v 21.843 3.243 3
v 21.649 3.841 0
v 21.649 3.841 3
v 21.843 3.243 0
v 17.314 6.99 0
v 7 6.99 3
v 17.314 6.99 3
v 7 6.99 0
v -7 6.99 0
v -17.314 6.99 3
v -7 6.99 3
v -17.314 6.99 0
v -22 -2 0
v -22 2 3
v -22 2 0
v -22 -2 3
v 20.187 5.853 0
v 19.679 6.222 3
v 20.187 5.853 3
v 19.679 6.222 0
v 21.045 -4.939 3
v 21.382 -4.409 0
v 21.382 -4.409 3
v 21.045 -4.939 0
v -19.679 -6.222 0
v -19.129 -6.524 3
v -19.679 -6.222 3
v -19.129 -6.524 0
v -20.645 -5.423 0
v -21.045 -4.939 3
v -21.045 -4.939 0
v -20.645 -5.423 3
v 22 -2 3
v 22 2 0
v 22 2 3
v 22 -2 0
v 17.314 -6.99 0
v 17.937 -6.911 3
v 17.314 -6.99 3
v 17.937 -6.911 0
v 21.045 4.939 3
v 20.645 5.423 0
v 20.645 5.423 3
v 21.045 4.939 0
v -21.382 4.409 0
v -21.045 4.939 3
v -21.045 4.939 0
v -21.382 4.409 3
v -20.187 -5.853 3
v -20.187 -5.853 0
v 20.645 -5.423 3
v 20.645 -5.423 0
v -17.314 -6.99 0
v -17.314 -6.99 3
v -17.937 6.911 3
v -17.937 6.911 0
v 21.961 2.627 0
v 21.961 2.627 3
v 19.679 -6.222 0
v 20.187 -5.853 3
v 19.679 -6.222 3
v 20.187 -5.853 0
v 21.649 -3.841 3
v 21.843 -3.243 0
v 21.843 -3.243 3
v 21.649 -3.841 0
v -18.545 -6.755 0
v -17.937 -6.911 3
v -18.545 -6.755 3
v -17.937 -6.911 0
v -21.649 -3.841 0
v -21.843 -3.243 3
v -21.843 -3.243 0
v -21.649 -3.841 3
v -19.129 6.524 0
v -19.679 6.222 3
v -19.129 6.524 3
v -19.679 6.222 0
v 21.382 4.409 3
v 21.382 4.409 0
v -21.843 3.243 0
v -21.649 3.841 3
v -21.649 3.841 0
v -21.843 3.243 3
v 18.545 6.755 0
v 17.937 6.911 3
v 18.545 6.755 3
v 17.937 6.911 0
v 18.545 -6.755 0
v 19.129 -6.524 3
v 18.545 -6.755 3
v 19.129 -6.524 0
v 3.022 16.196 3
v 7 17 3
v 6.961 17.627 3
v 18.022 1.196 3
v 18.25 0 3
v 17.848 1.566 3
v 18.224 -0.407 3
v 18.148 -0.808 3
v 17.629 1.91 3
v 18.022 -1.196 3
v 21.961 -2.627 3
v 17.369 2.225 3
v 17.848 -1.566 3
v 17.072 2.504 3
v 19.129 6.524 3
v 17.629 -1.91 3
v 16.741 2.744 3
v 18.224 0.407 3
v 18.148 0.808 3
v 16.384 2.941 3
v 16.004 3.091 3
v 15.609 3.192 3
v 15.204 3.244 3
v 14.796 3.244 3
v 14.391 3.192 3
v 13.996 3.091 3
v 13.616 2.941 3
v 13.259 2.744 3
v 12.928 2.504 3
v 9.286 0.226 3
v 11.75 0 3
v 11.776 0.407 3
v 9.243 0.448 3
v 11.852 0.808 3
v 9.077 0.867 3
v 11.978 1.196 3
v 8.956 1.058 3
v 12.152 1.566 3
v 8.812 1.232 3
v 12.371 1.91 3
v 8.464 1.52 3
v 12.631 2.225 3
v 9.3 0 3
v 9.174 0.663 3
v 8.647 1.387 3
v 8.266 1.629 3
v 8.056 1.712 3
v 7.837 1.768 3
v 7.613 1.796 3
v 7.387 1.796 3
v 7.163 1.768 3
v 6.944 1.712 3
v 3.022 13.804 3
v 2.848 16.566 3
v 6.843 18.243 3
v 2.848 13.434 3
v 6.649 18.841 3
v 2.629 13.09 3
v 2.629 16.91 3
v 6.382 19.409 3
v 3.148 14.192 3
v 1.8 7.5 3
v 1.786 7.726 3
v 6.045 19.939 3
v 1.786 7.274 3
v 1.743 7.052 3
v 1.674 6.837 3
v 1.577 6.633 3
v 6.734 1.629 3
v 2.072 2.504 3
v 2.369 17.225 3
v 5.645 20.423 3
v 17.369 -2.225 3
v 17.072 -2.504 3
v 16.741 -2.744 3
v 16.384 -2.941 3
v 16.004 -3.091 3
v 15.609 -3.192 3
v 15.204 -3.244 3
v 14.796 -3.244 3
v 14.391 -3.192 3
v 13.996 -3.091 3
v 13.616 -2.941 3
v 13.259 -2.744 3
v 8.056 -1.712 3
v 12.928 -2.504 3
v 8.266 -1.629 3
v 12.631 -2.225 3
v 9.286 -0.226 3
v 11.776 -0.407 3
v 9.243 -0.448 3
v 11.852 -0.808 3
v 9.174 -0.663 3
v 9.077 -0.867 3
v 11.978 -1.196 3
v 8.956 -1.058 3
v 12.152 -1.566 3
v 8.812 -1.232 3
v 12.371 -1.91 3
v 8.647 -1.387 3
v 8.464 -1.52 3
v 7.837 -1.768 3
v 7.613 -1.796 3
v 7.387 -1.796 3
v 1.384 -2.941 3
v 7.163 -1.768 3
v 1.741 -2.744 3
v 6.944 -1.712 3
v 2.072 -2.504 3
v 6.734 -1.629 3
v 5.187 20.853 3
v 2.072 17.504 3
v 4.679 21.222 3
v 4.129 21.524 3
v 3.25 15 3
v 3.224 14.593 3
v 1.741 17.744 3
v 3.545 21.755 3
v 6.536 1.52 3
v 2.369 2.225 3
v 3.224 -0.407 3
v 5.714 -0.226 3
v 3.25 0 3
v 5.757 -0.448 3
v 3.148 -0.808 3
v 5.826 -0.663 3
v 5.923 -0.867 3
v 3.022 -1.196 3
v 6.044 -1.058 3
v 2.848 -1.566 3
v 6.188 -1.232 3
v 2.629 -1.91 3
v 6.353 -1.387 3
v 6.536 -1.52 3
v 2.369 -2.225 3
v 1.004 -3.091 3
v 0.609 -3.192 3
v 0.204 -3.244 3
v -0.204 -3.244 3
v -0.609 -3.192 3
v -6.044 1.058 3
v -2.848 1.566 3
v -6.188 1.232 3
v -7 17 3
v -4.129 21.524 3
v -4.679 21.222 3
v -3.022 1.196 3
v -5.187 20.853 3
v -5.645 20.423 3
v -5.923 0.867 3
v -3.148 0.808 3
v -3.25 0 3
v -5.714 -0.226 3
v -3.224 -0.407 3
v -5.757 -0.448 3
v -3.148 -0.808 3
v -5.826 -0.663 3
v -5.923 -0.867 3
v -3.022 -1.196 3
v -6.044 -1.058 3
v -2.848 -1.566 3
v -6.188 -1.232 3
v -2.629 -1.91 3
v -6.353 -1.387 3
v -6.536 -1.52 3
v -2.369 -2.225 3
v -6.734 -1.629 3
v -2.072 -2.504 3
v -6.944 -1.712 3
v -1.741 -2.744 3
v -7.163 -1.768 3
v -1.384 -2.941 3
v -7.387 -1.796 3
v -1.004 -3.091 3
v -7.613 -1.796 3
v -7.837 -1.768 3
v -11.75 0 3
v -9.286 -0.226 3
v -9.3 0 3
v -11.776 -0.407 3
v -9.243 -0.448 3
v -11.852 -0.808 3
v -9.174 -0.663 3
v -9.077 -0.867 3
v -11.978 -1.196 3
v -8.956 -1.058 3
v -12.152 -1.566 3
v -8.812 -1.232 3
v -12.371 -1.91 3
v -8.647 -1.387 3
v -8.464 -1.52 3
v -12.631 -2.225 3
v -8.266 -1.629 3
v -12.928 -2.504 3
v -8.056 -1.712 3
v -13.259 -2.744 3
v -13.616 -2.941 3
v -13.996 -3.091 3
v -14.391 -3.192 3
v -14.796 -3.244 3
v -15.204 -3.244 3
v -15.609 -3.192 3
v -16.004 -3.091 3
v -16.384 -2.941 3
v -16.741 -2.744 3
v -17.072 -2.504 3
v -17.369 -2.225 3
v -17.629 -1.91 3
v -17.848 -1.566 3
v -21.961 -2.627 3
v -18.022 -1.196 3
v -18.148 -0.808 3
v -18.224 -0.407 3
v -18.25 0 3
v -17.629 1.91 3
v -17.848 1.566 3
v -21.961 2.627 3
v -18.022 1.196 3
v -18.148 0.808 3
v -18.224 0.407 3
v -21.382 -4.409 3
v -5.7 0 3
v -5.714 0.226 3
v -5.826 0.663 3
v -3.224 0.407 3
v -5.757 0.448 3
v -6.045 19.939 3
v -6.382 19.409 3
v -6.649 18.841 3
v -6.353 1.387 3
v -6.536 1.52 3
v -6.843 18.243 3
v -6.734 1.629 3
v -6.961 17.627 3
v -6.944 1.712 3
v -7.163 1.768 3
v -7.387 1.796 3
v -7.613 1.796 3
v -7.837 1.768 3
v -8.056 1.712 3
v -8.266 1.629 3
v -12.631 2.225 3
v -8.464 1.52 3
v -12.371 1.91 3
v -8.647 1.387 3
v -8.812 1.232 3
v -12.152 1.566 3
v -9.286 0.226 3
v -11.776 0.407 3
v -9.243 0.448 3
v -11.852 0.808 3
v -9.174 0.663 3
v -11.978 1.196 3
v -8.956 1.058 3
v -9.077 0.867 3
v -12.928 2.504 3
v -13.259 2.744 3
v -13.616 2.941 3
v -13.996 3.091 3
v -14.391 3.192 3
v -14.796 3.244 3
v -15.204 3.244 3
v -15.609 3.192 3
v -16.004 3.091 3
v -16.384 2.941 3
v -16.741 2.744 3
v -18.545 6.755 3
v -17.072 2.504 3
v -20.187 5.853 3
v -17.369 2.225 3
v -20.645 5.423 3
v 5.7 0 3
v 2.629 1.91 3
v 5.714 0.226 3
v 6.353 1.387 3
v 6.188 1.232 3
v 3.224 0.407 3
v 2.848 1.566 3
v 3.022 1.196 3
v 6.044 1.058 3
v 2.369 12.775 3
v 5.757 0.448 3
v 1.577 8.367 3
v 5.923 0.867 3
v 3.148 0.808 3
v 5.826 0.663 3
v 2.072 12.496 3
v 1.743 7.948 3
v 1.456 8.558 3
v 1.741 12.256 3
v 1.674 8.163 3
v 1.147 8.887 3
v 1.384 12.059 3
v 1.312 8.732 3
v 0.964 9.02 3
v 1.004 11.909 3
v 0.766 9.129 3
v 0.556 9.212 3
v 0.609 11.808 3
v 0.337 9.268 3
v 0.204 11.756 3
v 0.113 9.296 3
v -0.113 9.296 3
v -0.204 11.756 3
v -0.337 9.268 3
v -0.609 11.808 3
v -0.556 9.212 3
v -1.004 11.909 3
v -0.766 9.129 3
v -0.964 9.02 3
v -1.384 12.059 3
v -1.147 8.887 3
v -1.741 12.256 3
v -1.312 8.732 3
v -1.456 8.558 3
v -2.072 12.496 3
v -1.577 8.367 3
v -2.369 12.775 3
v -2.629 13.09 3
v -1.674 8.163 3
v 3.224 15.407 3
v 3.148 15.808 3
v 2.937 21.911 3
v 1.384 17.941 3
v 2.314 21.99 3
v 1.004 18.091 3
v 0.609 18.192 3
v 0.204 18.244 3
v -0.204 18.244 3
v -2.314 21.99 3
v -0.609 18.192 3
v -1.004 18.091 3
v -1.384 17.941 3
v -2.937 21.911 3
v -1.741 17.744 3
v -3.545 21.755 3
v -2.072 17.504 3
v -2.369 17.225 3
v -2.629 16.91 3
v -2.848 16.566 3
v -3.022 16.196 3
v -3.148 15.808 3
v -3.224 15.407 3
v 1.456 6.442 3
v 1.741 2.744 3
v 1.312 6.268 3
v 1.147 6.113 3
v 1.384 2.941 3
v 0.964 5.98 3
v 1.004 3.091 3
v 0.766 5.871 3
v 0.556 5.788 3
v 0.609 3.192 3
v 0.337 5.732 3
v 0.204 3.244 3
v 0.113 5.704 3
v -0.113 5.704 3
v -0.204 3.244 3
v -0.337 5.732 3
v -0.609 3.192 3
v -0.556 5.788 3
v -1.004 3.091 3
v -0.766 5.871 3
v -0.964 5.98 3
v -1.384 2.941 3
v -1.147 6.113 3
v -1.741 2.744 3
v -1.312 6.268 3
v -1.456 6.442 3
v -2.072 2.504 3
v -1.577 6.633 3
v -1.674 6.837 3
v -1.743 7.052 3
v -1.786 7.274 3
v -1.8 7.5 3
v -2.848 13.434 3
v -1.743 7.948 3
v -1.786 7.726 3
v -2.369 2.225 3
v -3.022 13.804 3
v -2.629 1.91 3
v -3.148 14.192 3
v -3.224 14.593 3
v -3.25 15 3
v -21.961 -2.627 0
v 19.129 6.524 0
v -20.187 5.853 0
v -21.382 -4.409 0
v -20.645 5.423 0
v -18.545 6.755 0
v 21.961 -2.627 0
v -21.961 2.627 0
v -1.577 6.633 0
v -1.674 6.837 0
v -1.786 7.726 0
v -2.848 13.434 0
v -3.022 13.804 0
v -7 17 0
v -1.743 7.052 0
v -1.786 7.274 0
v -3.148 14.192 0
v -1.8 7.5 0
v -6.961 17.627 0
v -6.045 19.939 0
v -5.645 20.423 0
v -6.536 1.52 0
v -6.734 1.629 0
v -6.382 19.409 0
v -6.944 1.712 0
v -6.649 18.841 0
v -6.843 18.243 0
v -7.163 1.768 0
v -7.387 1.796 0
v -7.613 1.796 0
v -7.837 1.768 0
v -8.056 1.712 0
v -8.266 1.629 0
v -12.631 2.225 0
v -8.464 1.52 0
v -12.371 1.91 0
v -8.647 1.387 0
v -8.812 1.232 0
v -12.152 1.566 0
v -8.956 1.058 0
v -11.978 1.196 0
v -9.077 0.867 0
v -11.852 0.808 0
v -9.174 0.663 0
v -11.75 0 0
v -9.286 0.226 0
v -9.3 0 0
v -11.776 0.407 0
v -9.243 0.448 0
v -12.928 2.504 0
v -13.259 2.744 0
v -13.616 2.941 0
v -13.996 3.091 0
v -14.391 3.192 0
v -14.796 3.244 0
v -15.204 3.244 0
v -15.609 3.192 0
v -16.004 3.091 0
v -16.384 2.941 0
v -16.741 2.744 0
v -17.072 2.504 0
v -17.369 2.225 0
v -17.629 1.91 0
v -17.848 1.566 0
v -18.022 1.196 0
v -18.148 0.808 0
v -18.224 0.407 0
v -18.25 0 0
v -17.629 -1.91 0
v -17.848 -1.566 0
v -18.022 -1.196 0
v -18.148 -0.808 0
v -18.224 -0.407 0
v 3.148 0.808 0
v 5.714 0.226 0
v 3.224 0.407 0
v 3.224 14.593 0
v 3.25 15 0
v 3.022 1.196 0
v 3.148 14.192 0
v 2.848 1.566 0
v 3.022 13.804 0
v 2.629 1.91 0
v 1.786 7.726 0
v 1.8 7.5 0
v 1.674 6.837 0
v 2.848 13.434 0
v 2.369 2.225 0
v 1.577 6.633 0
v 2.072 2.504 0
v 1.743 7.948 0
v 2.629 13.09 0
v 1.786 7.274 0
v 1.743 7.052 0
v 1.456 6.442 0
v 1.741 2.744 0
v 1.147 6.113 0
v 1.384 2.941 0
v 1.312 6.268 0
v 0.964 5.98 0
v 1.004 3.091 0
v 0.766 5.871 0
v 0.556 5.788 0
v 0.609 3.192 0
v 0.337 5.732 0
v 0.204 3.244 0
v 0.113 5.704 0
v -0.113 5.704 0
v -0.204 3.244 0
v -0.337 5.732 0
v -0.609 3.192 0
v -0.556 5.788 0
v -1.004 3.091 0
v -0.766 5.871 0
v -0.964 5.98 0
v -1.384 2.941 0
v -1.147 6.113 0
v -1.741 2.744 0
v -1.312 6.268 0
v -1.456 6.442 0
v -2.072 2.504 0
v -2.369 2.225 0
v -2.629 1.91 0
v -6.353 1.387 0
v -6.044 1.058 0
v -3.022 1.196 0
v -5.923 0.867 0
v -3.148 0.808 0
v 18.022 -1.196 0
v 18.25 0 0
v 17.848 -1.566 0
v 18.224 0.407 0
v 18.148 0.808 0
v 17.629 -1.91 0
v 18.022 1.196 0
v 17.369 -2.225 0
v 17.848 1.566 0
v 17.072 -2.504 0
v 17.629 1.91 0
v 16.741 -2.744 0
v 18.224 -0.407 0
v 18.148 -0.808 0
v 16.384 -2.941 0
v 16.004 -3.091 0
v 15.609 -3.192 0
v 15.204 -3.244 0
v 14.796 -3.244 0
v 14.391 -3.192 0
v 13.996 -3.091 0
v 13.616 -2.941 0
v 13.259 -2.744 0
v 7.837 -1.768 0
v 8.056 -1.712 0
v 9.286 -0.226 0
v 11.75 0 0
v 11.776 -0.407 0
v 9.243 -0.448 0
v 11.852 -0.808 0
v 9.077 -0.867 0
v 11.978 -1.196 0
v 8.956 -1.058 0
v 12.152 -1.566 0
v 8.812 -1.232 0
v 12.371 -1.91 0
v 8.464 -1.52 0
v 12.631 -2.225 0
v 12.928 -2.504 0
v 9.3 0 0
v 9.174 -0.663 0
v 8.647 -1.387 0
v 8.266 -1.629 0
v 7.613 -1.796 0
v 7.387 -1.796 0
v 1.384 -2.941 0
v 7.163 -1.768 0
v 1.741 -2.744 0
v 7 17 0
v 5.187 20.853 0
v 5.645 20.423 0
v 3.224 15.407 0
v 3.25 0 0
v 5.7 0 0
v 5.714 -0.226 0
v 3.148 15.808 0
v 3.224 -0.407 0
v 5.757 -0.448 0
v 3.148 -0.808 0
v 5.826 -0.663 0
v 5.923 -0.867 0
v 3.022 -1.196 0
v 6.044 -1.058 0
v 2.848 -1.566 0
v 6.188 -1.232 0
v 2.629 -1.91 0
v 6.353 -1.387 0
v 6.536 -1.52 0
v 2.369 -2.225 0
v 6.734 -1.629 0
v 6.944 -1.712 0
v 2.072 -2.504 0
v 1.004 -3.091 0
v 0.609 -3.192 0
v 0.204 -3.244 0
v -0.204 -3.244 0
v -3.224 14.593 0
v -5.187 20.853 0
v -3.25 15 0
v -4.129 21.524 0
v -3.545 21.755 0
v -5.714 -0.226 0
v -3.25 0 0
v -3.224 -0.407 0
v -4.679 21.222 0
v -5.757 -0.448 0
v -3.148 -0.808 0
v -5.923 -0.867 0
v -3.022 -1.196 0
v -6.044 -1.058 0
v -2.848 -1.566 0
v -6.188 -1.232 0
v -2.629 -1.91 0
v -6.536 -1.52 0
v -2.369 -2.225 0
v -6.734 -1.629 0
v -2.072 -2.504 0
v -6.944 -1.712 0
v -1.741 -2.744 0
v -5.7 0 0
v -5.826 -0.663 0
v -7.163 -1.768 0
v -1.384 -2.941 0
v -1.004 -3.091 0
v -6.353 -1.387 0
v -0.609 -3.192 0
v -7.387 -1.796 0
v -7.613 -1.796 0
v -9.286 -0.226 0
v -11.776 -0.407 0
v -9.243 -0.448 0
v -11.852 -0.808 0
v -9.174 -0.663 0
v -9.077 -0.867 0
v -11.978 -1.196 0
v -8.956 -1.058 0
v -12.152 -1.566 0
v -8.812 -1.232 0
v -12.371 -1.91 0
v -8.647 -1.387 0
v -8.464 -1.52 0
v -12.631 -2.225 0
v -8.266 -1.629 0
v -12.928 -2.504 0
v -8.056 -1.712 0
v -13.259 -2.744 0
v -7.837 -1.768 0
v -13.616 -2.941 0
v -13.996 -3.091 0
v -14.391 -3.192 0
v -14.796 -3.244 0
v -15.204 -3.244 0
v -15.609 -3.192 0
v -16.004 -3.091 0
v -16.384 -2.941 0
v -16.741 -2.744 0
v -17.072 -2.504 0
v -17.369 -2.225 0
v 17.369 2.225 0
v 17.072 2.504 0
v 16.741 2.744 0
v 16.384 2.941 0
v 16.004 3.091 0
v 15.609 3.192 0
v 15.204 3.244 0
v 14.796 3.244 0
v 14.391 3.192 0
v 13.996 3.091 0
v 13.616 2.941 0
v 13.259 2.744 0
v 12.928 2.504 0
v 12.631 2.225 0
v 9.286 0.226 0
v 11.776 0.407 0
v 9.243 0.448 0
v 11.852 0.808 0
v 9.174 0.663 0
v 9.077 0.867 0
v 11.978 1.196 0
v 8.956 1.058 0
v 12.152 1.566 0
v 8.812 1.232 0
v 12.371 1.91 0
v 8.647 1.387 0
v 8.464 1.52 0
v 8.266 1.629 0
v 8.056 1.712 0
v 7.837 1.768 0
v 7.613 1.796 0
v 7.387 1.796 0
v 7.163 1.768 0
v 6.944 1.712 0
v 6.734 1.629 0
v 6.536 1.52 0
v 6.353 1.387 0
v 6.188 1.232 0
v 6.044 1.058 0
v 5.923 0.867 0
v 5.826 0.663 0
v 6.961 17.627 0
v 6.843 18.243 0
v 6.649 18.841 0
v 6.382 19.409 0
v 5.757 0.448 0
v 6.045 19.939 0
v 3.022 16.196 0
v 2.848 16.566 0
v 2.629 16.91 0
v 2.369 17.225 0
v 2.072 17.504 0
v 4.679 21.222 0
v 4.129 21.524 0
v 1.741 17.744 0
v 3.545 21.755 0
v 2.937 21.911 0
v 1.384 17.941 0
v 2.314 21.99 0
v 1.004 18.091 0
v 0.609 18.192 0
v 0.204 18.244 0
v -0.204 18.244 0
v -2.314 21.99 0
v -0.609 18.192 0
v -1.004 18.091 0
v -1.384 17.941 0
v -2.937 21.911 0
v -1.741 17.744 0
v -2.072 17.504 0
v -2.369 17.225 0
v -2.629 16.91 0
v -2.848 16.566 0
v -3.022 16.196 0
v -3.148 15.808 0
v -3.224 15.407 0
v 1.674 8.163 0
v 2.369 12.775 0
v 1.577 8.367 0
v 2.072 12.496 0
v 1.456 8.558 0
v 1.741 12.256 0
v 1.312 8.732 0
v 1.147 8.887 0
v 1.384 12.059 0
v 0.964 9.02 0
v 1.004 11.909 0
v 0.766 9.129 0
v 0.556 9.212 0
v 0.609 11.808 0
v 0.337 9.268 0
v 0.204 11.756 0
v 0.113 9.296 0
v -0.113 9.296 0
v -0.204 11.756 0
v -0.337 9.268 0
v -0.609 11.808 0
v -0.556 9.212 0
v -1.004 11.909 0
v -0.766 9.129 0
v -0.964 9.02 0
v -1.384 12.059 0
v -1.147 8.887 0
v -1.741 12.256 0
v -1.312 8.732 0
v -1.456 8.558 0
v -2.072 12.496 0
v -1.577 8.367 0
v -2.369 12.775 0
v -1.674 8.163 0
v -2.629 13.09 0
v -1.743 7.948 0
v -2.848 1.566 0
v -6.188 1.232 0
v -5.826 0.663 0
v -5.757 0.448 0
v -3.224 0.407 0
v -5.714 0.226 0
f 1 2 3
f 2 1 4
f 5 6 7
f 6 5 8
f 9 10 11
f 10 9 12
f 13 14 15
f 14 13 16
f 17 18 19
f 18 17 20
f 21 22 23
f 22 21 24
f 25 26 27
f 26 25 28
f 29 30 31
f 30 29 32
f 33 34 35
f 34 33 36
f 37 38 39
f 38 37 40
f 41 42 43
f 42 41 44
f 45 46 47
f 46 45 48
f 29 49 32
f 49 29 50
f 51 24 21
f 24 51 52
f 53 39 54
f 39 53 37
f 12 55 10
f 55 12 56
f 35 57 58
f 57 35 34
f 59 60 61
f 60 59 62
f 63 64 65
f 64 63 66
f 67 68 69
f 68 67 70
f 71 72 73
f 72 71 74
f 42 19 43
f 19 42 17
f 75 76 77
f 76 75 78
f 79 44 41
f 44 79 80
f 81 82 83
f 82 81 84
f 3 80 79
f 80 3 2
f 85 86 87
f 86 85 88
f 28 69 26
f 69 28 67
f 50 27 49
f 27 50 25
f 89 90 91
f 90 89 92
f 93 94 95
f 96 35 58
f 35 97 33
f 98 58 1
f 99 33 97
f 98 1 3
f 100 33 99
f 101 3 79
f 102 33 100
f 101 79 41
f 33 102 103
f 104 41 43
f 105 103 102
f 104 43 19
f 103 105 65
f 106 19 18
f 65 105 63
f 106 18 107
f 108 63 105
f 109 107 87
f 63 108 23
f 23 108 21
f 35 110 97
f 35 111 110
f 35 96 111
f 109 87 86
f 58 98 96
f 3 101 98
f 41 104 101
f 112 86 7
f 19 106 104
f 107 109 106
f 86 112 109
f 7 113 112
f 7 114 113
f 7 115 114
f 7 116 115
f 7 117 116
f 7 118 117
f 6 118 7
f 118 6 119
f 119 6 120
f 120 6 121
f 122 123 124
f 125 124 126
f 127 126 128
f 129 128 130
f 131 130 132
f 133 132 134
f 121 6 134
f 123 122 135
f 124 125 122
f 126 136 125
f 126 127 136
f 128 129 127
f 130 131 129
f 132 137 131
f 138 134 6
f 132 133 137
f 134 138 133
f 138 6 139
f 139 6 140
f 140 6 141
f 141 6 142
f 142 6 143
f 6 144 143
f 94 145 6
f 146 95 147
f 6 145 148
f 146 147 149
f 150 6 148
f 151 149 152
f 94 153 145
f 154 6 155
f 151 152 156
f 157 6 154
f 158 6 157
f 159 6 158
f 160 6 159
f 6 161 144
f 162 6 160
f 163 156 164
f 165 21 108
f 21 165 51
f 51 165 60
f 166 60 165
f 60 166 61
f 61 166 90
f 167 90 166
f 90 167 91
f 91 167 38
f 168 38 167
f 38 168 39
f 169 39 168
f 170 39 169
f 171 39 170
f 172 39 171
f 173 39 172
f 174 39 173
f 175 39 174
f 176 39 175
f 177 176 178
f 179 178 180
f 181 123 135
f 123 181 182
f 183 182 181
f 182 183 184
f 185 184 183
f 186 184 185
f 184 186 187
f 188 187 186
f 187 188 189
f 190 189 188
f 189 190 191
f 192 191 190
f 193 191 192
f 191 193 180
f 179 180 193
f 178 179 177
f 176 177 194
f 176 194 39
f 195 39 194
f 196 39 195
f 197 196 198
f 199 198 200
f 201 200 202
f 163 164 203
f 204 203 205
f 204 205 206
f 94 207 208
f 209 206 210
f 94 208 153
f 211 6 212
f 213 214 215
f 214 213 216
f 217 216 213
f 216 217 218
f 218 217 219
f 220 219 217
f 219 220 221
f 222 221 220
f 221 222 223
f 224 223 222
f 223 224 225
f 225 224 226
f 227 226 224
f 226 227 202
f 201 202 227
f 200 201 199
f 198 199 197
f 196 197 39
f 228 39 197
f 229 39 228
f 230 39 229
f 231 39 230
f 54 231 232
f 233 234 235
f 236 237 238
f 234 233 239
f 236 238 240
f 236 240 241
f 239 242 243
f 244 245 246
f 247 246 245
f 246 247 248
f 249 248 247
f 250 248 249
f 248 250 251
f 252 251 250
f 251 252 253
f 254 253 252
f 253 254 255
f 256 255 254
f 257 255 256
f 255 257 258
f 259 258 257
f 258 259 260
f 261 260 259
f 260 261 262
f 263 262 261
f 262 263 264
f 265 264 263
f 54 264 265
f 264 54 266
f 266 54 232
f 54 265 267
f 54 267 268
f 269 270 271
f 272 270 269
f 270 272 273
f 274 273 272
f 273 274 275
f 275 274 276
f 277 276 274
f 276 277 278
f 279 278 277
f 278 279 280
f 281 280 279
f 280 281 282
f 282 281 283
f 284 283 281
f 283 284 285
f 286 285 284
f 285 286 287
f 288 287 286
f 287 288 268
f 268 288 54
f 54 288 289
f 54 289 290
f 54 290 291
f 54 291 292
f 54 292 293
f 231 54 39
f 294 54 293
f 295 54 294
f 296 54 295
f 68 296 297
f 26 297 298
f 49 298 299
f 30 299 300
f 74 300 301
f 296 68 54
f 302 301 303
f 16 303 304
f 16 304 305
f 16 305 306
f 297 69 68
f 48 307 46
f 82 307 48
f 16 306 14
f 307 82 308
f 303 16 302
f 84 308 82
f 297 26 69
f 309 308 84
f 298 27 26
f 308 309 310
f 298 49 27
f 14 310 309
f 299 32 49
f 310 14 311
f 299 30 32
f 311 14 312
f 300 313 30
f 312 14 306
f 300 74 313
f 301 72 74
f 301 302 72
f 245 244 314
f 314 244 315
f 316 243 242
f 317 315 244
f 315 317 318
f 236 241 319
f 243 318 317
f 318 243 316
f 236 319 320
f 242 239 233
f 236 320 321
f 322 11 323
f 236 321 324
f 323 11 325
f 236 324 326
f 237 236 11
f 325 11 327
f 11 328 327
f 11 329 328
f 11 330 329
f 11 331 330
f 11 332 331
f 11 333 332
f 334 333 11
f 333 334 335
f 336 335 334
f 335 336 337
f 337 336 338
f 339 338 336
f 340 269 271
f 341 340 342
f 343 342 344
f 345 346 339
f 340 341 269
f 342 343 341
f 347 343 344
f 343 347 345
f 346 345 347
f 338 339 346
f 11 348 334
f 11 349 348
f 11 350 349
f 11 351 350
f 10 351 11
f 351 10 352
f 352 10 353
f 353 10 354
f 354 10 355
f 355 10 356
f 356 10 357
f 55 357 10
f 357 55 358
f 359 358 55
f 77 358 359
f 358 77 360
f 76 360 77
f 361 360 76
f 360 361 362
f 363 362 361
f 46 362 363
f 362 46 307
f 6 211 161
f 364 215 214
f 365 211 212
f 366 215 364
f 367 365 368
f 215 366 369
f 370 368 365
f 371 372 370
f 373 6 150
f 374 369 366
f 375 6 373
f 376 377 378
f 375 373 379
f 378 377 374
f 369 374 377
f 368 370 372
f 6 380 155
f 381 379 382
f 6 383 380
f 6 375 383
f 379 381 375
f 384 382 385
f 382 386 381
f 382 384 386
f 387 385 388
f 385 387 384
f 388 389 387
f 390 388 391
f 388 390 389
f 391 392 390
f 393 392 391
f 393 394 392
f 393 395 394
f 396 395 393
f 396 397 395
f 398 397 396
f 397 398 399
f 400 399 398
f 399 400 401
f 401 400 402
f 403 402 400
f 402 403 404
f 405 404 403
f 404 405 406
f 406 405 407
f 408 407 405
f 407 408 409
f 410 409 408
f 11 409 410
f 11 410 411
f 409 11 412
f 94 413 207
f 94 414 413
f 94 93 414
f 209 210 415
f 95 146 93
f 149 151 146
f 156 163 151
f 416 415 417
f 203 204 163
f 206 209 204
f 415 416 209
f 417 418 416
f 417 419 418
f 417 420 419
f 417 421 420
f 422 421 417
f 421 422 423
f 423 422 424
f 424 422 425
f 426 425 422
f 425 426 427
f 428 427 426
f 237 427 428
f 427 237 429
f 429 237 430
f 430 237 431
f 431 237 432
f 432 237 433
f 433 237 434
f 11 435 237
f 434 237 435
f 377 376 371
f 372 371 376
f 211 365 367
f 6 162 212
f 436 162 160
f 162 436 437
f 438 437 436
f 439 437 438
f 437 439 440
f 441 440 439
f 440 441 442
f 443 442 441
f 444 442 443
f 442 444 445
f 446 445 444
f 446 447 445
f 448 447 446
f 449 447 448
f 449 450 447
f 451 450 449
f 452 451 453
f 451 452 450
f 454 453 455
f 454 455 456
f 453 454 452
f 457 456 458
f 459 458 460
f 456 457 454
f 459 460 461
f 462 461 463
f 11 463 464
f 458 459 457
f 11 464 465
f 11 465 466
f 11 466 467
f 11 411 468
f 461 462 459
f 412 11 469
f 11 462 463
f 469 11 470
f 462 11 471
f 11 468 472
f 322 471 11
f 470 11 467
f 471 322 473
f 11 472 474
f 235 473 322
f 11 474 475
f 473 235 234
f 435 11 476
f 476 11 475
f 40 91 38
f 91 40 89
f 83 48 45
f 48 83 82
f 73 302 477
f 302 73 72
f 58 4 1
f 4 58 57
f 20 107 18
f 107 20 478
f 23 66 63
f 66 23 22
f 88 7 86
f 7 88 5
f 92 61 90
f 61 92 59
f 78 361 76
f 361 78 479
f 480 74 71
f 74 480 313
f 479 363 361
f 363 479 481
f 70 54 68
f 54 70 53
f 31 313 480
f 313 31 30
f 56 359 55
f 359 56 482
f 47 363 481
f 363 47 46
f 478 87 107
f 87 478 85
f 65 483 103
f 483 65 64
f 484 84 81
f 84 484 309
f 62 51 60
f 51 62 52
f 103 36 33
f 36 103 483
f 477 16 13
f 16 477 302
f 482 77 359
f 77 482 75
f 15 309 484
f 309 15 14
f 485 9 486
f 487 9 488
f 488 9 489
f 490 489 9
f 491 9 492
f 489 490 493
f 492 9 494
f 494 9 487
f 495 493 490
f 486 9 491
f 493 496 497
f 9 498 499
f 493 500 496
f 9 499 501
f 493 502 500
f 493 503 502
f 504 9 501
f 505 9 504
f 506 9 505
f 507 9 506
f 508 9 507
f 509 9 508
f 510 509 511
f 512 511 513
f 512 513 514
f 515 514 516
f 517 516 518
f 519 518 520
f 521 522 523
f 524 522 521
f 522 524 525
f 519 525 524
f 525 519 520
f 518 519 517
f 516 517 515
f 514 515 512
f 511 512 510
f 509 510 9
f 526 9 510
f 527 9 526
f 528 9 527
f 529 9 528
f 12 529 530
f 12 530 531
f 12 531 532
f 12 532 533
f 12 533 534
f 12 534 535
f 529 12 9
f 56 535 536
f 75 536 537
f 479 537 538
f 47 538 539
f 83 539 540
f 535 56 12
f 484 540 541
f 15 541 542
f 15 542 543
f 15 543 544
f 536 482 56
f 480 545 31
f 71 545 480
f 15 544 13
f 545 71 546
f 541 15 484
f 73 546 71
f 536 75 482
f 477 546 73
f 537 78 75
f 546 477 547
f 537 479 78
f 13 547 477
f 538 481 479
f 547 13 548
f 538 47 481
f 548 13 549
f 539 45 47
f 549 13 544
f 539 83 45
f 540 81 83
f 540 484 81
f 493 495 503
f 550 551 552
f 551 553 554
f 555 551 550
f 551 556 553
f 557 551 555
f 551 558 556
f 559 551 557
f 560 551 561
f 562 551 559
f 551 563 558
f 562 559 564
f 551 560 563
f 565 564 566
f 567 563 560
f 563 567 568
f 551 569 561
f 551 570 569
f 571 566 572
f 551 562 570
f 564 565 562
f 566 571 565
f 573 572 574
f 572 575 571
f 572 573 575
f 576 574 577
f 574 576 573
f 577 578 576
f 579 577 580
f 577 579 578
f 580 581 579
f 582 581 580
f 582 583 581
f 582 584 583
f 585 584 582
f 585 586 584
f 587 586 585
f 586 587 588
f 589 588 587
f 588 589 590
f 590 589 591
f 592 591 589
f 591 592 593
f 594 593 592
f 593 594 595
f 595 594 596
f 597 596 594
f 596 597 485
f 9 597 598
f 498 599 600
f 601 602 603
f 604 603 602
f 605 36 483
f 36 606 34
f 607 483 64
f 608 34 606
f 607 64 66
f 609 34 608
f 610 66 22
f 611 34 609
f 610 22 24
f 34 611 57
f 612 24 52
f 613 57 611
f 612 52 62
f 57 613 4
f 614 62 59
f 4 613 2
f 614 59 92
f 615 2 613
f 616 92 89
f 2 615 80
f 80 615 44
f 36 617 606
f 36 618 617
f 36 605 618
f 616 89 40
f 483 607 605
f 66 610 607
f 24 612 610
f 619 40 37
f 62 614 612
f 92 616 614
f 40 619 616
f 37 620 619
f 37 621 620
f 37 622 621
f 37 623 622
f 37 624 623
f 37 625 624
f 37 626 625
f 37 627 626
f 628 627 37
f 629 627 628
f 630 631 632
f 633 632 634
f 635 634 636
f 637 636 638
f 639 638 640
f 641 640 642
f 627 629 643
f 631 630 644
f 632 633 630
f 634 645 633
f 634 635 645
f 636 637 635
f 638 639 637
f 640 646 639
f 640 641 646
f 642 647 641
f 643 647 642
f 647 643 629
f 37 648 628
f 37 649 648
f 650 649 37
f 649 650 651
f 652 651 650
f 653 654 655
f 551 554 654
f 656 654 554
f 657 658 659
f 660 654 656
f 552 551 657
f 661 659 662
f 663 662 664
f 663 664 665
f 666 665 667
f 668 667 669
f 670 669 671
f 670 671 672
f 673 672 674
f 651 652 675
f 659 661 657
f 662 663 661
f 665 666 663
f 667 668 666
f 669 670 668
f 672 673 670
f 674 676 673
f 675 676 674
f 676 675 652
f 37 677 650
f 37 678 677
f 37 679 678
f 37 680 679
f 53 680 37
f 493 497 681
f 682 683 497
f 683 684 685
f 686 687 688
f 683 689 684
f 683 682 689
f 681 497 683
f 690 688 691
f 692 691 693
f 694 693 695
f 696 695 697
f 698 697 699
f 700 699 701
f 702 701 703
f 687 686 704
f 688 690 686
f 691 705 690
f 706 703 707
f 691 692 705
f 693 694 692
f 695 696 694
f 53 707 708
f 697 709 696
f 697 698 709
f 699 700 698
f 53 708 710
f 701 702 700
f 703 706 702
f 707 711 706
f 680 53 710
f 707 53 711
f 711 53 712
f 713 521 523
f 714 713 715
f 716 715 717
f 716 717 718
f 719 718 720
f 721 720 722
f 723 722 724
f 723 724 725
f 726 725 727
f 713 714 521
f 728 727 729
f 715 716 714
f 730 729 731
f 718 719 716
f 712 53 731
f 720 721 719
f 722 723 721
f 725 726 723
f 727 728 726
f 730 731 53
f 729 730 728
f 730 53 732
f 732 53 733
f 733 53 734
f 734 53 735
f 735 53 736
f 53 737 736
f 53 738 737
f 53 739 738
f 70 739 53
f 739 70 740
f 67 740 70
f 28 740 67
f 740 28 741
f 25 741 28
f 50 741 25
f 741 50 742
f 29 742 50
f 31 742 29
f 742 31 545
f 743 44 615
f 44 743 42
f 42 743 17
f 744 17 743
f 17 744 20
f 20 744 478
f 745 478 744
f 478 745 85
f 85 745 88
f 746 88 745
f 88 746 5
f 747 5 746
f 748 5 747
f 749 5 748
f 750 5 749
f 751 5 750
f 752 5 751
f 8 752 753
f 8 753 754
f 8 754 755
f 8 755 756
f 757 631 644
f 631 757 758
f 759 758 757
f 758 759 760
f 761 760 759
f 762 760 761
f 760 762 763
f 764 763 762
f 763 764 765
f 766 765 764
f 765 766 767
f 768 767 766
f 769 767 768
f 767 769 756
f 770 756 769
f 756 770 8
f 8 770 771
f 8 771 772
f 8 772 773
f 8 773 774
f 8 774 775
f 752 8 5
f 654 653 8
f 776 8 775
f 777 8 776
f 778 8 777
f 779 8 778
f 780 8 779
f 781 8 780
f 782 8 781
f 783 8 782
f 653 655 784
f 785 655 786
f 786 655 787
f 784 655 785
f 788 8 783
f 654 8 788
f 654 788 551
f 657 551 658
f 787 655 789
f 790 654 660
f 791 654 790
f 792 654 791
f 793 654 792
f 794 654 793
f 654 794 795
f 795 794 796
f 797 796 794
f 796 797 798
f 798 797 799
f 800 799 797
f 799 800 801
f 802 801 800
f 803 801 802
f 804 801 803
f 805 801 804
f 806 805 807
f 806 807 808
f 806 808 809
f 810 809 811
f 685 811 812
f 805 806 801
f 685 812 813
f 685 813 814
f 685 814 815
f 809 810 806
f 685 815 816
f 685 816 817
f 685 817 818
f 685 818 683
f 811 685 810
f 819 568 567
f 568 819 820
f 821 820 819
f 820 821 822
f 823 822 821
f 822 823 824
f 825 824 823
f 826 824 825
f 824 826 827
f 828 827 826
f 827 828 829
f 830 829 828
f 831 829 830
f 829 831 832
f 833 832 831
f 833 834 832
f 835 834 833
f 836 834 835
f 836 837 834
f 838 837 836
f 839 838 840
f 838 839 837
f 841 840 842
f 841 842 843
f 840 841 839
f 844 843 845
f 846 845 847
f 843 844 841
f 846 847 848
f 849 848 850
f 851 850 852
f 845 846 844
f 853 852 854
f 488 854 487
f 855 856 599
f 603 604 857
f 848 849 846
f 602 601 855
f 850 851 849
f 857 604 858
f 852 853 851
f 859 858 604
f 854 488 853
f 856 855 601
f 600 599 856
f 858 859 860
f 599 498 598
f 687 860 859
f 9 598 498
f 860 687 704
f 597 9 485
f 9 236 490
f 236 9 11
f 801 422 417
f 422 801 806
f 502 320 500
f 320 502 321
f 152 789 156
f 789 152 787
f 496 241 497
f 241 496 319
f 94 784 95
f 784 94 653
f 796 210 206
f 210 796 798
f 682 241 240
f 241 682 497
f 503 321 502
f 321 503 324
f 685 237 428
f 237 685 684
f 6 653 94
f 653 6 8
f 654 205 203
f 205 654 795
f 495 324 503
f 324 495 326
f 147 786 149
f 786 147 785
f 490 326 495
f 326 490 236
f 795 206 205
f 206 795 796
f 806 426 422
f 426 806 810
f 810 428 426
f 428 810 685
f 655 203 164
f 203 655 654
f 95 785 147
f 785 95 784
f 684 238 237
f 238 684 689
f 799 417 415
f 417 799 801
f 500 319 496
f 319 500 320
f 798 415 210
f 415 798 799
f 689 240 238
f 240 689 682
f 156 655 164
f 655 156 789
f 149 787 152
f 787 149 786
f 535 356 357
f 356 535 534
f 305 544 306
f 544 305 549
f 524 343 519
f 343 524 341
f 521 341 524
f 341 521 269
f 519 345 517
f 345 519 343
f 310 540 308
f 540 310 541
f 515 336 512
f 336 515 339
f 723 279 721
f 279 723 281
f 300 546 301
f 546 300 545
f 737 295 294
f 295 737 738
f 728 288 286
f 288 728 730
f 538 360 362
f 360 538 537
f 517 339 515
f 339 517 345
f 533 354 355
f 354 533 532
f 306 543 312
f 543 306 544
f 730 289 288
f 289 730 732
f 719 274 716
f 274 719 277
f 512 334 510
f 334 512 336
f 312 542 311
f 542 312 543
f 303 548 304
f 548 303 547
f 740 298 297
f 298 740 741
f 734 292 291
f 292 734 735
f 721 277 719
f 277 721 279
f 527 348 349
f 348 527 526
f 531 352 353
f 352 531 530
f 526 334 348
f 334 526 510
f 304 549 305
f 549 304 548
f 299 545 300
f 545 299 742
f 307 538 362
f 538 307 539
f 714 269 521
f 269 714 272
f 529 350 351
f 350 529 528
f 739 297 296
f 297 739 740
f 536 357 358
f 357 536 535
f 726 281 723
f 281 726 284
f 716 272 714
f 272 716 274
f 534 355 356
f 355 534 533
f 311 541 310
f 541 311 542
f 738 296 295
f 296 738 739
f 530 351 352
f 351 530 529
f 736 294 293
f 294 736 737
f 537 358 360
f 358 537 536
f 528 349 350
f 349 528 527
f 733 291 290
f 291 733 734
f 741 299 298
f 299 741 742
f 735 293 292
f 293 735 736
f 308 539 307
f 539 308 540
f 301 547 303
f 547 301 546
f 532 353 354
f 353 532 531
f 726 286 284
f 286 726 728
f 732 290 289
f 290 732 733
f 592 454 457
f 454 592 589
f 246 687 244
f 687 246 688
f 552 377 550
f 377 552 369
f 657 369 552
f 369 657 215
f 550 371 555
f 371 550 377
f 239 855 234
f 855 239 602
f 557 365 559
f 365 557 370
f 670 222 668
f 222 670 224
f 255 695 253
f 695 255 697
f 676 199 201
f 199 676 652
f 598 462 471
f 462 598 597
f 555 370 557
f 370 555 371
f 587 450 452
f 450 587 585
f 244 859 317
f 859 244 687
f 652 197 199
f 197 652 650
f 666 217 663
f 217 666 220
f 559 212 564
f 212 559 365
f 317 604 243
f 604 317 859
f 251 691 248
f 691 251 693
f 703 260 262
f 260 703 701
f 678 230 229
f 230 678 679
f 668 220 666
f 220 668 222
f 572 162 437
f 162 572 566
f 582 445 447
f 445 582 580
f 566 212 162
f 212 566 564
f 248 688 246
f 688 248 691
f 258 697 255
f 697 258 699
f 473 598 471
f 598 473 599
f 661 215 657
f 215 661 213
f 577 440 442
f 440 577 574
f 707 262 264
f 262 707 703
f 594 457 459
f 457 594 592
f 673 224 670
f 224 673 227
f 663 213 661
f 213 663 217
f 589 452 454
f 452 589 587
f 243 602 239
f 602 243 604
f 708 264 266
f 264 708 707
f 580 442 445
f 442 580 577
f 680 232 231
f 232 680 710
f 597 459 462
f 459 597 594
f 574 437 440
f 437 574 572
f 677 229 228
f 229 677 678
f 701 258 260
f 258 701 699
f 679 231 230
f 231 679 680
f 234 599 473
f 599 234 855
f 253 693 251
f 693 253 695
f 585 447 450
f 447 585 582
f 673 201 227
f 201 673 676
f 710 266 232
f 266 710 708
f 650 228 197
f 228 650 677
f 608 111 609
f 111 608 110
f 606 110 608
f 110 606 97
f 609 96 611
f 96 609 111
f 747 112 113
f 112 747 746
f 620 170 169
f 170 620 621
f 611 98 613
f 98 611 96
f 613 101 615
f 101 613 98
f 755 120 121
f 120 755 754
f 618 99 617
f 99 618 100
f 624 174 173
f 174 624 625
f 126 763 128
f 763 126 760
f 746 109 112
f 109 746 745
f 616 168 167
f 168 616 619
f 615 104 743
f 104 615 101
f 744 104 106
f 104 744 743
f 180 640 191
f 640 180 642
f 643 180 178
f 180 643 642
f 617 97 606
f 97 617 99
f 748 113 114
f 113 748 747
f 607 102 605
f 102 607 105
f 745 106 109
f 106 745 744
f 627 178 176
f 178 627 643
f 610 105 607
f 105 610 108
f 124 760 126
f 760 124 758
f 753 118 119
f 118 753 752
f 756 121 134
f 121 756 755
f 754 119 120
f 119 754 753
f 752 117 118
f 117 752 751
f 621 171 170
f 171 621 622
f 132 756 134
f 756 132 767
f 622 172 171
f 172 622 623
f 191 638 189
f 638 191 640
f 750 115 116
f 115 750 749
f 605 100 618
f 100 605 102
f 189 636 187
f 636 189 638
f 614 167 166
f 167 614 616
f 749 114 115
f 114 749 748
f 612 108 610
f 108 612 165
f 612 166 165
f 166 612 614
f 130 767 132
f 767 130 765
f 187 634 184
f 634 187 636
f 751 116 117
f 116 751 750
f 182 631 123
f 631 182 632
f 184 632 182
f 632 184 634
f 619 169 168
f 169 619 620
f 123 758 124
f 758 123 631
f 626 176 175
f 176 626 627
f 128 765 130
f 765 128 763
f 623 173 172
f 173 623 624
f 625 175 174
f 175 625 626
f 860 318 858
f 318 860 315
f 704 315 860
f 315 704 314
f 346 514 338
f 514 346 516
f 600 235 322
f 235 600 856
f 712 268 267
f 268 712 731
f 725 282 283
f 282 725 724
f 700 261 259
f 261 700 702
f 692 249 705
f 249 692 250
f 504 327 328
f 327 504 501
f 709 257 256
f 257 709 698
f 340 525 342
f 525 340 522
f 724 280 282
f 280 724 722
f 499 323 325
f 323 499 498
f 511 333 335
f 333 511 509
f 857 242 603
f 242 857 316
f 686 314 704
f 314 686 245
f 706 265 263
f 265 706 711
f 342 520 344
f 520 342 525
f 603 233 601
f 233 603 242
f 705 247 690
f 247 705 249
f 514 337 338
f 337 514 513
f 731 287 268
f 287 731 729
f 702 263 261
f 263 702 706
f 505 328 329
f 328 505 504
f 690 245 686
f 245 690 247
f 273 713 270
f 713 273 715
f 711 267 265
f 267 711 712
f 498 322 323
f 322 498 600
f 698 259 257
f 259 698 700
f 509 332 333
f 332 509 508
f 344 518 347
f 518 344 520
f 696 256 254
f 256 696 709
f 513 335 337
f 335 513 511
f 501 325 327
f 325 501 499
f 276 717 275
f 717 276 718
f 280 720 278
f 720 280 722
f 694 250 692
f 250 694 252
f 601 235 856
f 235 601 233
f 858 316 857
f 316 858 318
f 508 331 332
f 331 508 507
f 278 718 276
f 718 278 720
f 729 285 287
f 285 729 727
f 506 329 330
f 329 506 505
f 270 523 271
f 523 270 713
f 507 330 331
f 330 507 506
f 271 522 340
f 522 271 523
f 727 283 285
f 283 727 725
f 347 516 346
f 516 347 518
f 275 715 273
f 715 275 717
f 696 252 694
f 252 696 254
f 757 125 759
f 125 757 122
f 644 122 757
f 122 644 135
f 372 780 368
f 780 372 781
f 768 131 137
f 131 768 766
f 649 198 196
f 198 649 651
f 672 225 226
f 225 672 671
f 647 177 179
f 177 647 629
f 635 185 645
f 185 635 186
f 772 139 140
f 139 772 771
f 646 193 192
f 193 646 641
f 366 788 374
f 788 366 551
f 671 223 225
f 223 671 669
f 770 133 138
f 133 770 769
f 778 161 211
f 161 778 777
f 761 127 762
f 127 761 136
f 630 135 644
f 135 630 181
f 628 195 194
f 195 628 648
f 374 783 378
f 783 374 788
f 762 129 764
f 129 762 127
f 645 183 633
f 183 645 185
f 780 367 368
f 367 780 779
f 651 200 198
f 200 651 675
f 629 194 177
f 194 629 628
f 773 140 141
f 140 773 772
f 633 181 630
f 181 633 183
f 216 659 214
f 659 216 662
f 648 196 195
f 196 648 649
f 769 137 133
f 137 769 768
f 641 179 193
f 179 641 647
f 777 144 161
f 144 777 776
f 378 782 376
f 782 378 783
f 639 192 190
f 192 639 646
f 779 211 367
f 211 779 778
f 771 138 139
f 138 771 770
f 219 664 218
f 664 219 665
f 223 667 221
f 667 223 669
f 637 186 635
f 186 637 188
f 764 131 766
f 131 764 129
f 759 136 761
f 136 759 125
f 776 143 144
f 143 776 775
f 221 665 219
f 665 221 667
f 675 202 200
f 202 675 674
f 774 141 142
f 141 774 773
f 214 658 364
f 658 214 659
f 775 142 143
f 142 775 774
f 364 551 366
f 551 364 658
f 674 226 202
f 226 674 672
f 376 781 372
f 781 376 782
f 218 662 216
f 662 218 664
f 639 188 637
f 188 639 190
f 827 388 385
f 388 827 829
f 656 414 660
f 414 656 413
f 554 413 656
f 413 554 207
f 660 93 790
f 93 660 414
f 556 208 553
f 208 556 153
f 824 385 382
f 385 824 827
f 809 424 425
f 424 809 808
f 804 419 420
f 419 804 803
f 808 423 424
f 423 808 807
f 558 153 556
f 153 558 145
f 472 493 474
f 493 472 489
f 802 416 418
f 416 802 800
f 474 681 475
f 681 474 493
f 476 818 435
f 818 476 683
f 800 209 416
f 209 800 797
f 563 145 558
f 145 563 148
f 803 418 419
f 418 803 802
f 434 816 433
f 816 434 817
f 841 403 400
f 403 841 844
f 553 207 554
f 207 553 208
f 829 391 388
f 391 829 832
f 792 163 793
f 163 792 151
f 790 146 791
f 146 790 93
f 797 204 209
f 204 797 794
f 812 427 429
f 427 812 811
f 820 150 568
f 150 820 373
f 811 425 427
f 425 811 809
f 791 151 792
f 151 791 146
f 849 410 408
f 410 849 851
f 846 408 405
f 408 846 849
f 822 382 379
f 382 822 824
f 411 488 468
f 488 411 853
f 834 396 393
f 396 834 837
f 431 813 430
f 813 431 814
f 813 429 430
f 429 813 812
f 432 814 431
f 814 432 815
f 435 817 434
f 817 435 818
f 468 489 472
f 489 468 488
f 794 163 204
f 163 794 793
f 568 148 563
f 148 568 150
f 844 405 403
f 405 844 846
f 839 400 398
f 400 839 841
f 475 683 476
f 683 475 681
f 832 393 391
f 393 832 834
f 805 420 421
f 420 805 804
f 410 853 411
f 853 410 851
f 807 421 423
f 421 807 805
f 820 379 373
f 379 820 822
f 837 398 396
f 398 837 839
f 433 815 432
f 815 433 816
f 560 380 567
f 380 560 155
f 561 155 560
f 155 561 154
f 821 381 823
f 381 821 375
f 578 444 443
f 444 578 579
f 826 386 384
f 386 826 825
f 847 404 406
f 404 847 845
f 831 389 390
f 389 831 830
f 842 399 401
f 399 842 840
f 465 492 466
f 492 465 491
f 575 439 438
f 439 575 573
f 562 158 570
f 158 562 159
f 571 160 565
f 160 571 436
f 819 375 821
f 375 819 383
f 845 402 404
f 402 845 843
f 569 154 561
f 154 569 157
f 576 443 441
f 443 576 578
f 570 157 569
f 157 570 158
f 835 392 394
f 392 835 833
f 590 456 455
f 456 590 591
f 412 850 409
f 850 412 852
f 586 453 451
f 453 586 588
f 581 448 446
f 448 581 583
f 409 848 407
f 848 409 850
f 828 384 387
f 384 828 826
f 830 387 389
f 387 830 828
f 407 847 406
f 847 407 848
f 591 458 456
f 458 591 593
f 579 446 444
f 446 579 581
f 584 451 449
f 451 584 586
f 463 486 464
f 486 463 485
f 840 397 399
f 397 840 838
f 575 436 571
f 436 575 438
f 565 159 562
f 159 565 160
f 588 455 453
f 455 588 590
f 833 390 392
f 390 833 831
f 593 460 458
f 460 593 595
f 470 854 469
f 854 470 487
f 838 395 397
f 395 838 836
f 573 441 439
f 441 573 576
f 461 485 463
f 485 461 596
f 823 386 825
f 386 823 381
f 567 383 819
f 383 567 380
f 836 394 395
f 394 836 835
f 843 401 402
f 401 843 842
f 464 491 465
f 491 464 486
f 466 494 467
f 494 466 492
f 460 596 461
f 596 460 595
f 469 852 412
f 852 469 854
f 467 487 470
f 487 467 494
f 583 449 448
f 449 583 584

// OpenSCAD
$fn = 50;


difference() {
	union() {
		*color(alpha = 1.0000000000, c = "gray") {
			translate(v = [0, 7, 0]) {
				linear_extrude(height = 1) {
					text(font = "Arial:style=Bold", halign = "center", size = 4.5000000000, text = "COMMENT plate main", valign = "center");
				}
			}
		}
		*color(alpha = 1.0000000000, c = "gray") {
			translate(v = [0, 14, 0]) {
				linear_extrude(height = 1) {
					text(font = "Arial:style=Bold", halign = "center", size = 4.5000000000, text = "COMMENT description oobb_plate_shape_p_type_3_depth_3_width_1_height_3_thickness_false_full_object", valign = "center");
				}
			}
		}
		hull() {
			translate(v = [-17.0000000000, 2.0000000000, 0]) {
				cylinder(h = 3, r = 5);
			}
			translate(v = [17.0000000000, 2.0000000000, 0]) {
				cylinder(h = 3, r = 5);
			}
			translate(v = [-17.0000000000, -2.0000000000, 0]) {
				cylinder(h = 3, r = 5);
			}
			translate(v = [17.0000000000, -2.0000000000, 0]) {
				cylinder(h = 3, r = 5);
			}
		}
		*color(alpha = 1.0000000000, c = "gray") {
			translate(v = [0, 7, 0]) {
				linear_extrude(height = 1) {
					text(font = "Arial:style=Bold", halign = "center", size = 4.5000000000, text = "COMMENT plate main", valign = "center");
				}
			}
		}
		*color(alpha = 1.0000000000, c = "gray") {
			translate(v = [0, 21.5000000000, 0]) {
				linear_extrude(height = 2) {
					text(font = "Arial:style=Bold", halign = "center", size = 4.5000000000, text = "COMMENT description oobb_plate_shape_p_type_3_depth_0_7.5_0_pos_1_width_2_height_3_thickness_false_full_object", valign = "center");
				}
			}
		}
		translate(v = [0, 7.5000000000, 0]) {
			hull() {
				translate(v = [-2.0000000000, 9.5000000000, 0]) {
					cylinder(h = 3, r = 5);
				}
				translate(v = [2.0000000000, 9.5000000000, 0]) {
					cylinder(h = 3, r = 5);
				}
				translate(v = [-2.0000000000, -9.5000000000, 0]) {
					cylinder(h = 3, r = 5);
				}
				translate(v = [2.0000000000, -9.5000000000, 0]) {
					cylinder(h = 3, r = 5);
				}
			}
		}
	}
	union() {
		*color(alpha = 1.0000000000, c = "gray") {
			translate(v = [0, 7, 0]) {
				linear_extrude(height = 1) {
					text(font = "Arial:style=Bold", halign = "center", size = 4.5000000000, text = "COMMENT holes main", valign = "center");
				}
			}
		}
		*color(alpha = 1.0000000000, c = "gray") {
			translate(v = [0, 14, 0]) {
				linear_extrude(height = 1) {
					text(font = "Arial:style=Bold", halign = "center", size = 4.5000000000, text = "COMMENT description oobb_holes_shape_n_type_3_width_1_height_3_thickness_false_full_object_true_both_holes", valign = "center");
				}
			}
		}
		translate(v = [-15.0000000000, 0.0000000000, 0]) {
			translate(v = [0, 0, -50]) {
				cylinder(h = 100, r = 3.2500000000);
			}
		}
		translate(v = [0, 0, -50]) {
			cylinder(h = 100, r = 3.2500000000);
		}
		translate(v = [15.0000000000, 0.0000000000, 0]) {
			translate(v = [0, 0, -50]) {
				cylinder(h = 100, r = 3.2500000000);
			}
		}
		translate(v = [-15.0000000000, 0.0000000000, 0]) {
			translate(v = [0, 0, -50]) {
				cylinder(h = 100, r = 1.8000000000);
			}
		}
		translate(v = [-7.5000000000, 0.0000000000, 0]) {
			translate(v = [0, 0, -50]) {
				cylinder(h = 100, r = 1.8000000000);
			}
		}
		translate(v = [0, 0, -50]) {
			cylinder(h = 100, r = 1.8000000000);
		}
		translate(v = [7.5000000000, 0.0000000000, 0]) {
			translate(v = [0, 0, -50]) {
				cylinder(h = 100, r = 1.8000000000);
			}
		}
		translate(v = [15.0000000000, 0.0000000000, 0]) {
			translate(v = [0, 0, -50]) {
				cylinder(h = 100, r = 1.8000000000);
			}
		}
		*color(alpha = 1.0000000000, c = "gray") {
			translate(v = [0, 7, 0]) {
				linear_extrude(height = 1) {
					text(font = "Arial:style=Bold", halign = "center", size = 4.5000000000, text = "COMMENT holes main", valign = "center");
				}
			}
		}
		*color(alpha = 1.0000000000, c = "gray") {
			translate(v = [0, 21.5000000000, 0]) {
				linear_extrude(height = 2) {
					text(font = "Arial:style=Bold", halign = "center", size = 4.5000000000, text = "COMMENT description oobb_holes_shape_n_type_0_7.5_0_pos_1_width_2_height_3_thickness_false_full_object_true_both_holes", valign = "center");
				}
			}
		}
		translate(v = [0, 0, -50]) {
			cylinder(h = 100, r = 3.2500000000);
		}
		translate(v = [0.0000000000, 15.0000000000, 0]) {
			translate(v = [0, 0, -50]) {
				cylinder(h = 100, r = 3.2500000000);
			}
		}
		translate(v = [0, 0, -50]) {
			cylinder(h = 100, r = 1.8000000000);
		}
		translate(v = [0.0000000000, 7.5000000000, 0]) {
			translate(v = [0, 0, -50]) {
				cylinder(h = 100, r = 1.8000000000);
			}
		}
		translate(v = [0.0000000000, 15.0000000000, 0]) {
			translate(v = [0, 0, -50]) {
				cylinder(h = 100, r = 1.8000000000);
			}
		}
	}
}
